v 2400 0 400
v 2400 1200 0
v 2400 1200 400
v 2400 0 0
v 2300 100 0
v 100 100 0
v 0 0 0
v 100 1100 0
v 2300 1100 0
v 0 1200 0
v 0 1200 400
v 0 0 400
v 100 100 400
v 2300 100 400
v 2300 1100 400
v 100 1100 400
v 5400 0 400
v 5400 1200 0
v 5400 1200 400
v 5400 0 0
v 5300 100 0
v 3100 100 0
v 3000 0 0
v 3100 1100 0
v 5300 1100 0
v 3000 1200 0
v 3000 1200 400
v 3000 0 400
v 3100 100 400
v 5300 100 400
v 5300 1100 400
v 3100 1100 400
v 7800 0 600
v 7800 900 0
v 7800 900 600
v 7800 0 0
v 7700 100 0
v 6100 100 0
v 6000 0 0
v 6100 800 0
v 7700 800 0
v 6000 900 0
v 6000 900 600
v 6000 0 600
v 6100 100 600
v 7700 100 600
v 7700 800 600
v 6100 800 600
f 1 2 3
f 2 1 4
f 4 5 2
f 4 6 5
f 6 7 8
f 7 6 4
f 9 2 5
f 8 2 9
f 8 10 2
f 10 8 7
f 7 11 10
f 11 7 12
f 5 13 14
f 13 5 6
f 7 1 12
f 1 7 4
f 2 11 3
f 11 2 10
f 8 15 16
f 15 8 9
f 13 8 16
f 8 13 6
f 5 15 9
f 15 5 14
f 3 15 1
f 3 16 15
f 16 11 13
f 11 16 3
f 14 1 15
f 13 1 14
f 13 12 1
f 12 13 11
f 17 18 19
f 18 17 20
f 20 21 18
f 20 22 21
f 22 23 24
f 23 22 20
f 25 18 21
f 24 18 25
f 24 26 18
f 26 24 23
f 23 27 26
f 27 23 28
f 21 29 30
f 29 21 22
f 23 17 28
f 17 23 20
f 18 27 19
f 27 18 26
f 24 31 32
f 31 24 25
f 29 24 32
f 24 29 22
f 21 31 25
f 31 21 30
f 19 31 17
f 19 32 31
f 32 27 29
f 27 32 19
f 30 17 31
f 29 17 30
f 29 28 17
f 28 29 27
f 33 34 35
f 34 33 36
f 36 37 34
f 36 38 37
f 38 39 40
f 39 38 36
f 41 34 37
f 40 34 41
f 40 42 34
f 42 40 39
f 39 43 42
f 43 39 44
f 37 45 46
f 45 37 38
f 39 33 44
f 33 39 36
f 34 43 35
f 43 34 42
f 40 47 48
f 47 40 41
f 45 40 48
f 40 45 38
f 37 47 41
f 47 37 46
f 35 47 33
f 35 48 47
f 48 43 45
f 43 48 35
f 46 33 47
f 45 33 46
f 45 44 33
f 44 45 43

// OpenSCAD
// Generated from plan.json; millimetres. Not a structural design.
// Open in OpenSCAD. Increase explode_mm to inspect courses.
explode_mm = 0;
$fn = 24;
show_fixing_paths = false;

// front-01-C1-S
translate([0, 0, 0+0*explode_mm])
  color([0.70,0.52,0.33]) cube([2400, 100, 200]);
// front-01-C1-N
translate([0, 1100, 0+0*explode_mm])
  color([0.70,0.52,0.33]) cube([2400, 100, 200]);
// front-01-C1-W
translate([0, 100, 0+0*explode_mm])
  color([0.70,0.52,0.33]) cube([100, 1000, 200]);
// front-01-C1-E
translate([2300, 100, 0+0*explode_mm])
  color([0.70,0.52,0.33]) cube([100, 1000, 200]);
// front-01-C2-S
translate([100, 0, 200+1*explode_mm])
  color([0.70,0.52,0.33]) cube([2200, 100, 200]);
// front-01-C2-N
translate([100, 1100, 200+1*explode_mm])
  color([0.70,0.52,0.33]) cube([2200, 100, 200]);
// front-01-C2-W
translate([0, 0, 200+1*explode_mm])
  color([0.70,0.52,0.33]) cube([100, 1200, 200]);
// front-01-C2-E
translate([2300, 0, 200+1*explode_mm])
  color([0.70,0.52,0.33]) cube([100, 1200, 200]);
// front-02-C1-S
translate([3000, 0, 0+0*explode_mm])
  color([0.70,0.52,0.33]) cube([2400, 100, 200]);
// front-02-C1-N
translate([3000, 1100, 0+0*explode_mm])
  color([0.70,0.52,0.33]) cube([2400, 100, 200]);
// front-02-C1-W
translate([3000, 100, 0+0*explode_mm])
  color([0.70,0.52,0.33]) cube([100, 1000, 200]);
// front-02-C1-E
translate([5300, 100, 0+0*explode_mm])
  color([0.70,0.52,0.33]) cube([100, 1000, 200]);
// front-02-C2-S
translate([3100, 0, 200+1*explode_mm])
  color([0.70,0.52,0.33]) cube([2200, 100, 200]);
// front-02-C2-N
translate([3100, 1100, 200+1*explode_mm])
  color([0.70,0.52,0.33]) cube([2200, 100, 200]);
// front-02-C2-W
translate([3000, 0, 200+1*explode_mm])
  color([0.70,0.52,0.33]) cube([100, 1200, 200]);
// front-02-C2-E
translate([5300, 0, 200+1*explode_mm])
  color([0.70,0.52,0.33]) cube([100, 1200, 200]);
// side-01-C1-S
translate([6000, 0, 0+0*explode_mm])
  color([0.70,0.52,0.33]) cube([1800, 100, 200]);
// side-01-C1-N
translate([6000, 800, 0+0*explode_mm])
  color([0.70,0.52,0.33]) cube([1800, 100, 200]);
// side-01-C1-W
translate([6000, 100, 0+0*explode_mm])
  color([0.70,0.52,0.33]) cube([100, 700, 200]);
// side-01-C1-E
translate([7700, 100, 0+0*explode_mm])
  color([0.70,0.52,0.33]) cube([100, 700, 200]);
// side-01-C2-S
translate([6100, 0, 200+1*explode_mm])
  color([0.70,0.52,0.33]) cube([1600, 100, 200]);
// side-01-C2-N
translate([6100, 800, 200+1*explode_mm])
  color([0.70,0.52,0.33]) cube([1600, 100, 200]);
// side-01-C2-W
translate([6000, 0, 200+1*explode_mm])
  color([0.70,0.52,0.33]) cube([100, 900, 200]);
// side-01-C2-E
translate([7700, 0, 200+1*explode_mm])
  color([0.70,0.52,0.33]) cube([100, 900, 200]);
// side-01-C3-S
translate([6000, 0, 400+2*explode_mm])
  color([0.70,0.52,0.33]) cube([1800, 100, 200]);
// side-01-C3-N
translate([6000, 800, 400+2*explode_mm])
  color([0.70,0.52,0.33]) cube([1800, 100, 200]);
// side-01-C3-W
translate([6000, 100, 400+2*explode_mm])
  color([0.70,0.52,0.33]) cube([100, 700, 200]);
// side-01-C3-E
translate([7700, 100, 400+2*explode_mm])
  color([0.70,0.52,0.33]) cube([100, 700, 200]);
if (show_fixing_paths) translate([50.0, 1200, 50.0+0*explode_mm]) rotate([90,0,0]) color([0.8,0.1,0.1]) cylinder(d=7, h=150);
if (show_fixing_paths) translate([50.0, 1200, 150.0+0*explode_mm]) rotate([90,0,0]) color([0.8,0.1,0.1]) cylinder(d=7, h=150);
if (show_fixing_paths) translate([2350.0, 1200, 50.0+0*explode_mm]) rotate([90,0,0]) color([0.8,0.1,0.1]) cylinder(d=7, h=150);
if (show_fixing_paths) translate([2350.0, 1200, 150.0+0*explode_mm]) rotate([90,0,0]) color([0.8,0.1,0.1]) cylinder(d=7, h=150);
if (show_fixing_paths) translate([50.0, 0, 50.0+0*explode_mm]) rotate([-90,0,0]) color([0.8,0.1,0.1]) cylinder(d=7, h=150);
if (show_fixing_paths) translate([50.0, 0, 150.0+0*explode_mm]) rotate([-90,0,0]) color([0.8,0.1,0.1]) cylinder(d=7, h=150);
if (show_fixing_paths) translate([2350.0, 0, 50.0+0*explode_mm]) rotate([-90,0,0]) color([0.8,0.1,0.1]) cylinder(d=7, h=150);
if (show_fixing_paths) translate([2350.0, 0, 150.0+0*explode_mm]) rotate([-90,0,0]) color([0.8,0.1,0.1]) cylinder(d=7, h=150);
if (show_fixing_paths) translate([2400, 50.0, 250.0+1*explode_mm]) rotate([0,-90,0]) color([0.8,0.1,0.1]) cylinder(d=7, h=150);
if (show_fixing_paths) translate([2400, 50.0, 350.0+1*explode_mm]) rotate([0,-90,0]) color([0.8,0.1,0.1]) cylinder(d=7, h=150);
if (show_fixing_paths) translate([2400, 1150.0, 250.0+1*explode_mm]) rotate([0,-90,0]) color([0.8,0.1,0.1]) cylinder(d=7, h=150);
if (show_fixing_paths) translate([2400, 1150.0, 350.0+1*explode_mm]) rotate([0,-90,0]) color([0.8,0.1,0.1]) cylinder(d=7, h=150);
if (show_fixing_paths) translate([2350.0, 200.0, 400+1*explode_mm]) rotate([180,0,0]) color([0.8,0.1,0.1]) cylinder(d=7, h=250);
if (show_fixing_paths) translate([2350.0, 600.0, 400+1*explode_mm]) rotate([180,0,0]) color([0.8,0.1,0.1]) cylinder(d=7, h=250);
if (show_fixing_paths) translate([2350.0, 1000.0, 400+1*explode_mm]) rotate([180,0,0]) color([0.8,0.1,0.1]) cylinder(d=7, h=250);
if (show_fixing_paths) translate([300.0, 1150.0, 400+1*explode_mm]) rotate([180,0,0]) color([0.8,0.1,0.1]) cylinder(d=7, h=250);
if (show_fixing_paths) translate([900.0, 1150.0, 400+1*explode_mm]) rotate([180,0,0]) color([0.8,0.1,0.1]) cylinder(d=7, h=250);
if (show_fixing_paths) translate([1500.0, 1150.0, 400+1*explode_mm]) rotate([180,0,0]) color([0.8,0.1,0.1]) cylinder(d=7, h=250);
if (show_fixing_paths) translate([2100.0, 1150.0, 400+1*explode_mm]) rotate([180,0,0]) color([0.8,0.1,0.1]) cylinder(d=7, h=250);
if (show_fixing_paths) translate([300.0, 50.0, 400+1*explode_mm]) rotate([180,0,0]) color([0.8,0.1,0.1]) cylinder(d=7, h=250);
if (show_fixing_paths) translate([900.0, 50.0, 400+1*explode_mm]) rotate([180,0,0]) color([0.8,0.1,0.1]) cylinder(d=7, h=250);
if (show_fixing_paths) translate([1500.0, 50.0, 400+1*explode_mm]) rotate([180,0,0]) color([0.8,0.1,0.1]) cylinder(d=7, h=250);
if (show_fixing_paths) translate([2100.0, 50.0, 400+1*explode_mm]) rotate([180,0,0]) color([0.8,0.1,0.1]) cylinder(d=7, h=250);
if (show_fixing_paths) translate([0, 50.0, 250.0+1*explode_mm]) rotate([0,90,0]) color([0.8,0.1,0.1]) cylinder(d=7, h=150);
if (show_fixing_paths) translate([0, 50.0, 350.0+1*explode_mm]) rotate([0,90,0]) color([0.8,0.1,0.1]) cylinder(d=7, h=150);
if (show_fixing_paths) translate([0, 1150.0, 250.0+1*explode_mm]) rotate([0,90,0]) color([0.8,0.1,0.1]) cylinder(d=7, h=150);
if (show_fixing_paths) translate([0, 1150.0, 350.0+1*explode_mm]) rotate([0,90,0]) color([0.8,0.1,0.1]) cylinder(d=7, h=150);
if (show_fixing_paths) translate([50.0, 200.0, 400+1*explode_mm]) rotate([180,0,0]) color([0.8,0.1,0.1]) cylinder(d=7, h=250);
if (show_fixing_paths) translate([50.0, 600.0, 400+1*explode_mm]) rotate([180,0,0]) color([0.8,0.1,0.1]) cylinder(d=7, h=250);
if (show_fixing_paths) translate([50.0, 1000.0, 400+1*explode_mm]) rotate([180,0,0]) color([0.8,0.1,0.1]) cylinder(d=7, h=250);
if (show_fixing_paths) translate([3050.0, 1200, 50.0+0*explode_mm]) rotate([90,0,0]) color([0.8,0.1,0.1]) cylinder(d=7, h=150);
if (show_fixing_paths) translate([3050.0, 1200, 150.0+0*explode_mm]) rotate([90,0,0]) color([0.8,0.1,0.1]) cylinder(d=7, h=150);
if (show_fixing_paths) translate([5350.0, 1200, 50.0+0*explode_mm]) rotate([90,0,0]) color([0.8,0.1,0.1]) cylinder(d=7, h=150);
if (show_fixing_paths) translate([5350.0, 1200, 150.0+0*explode_mm]) rotate([90,0,0]) color([0.8,0.1,0.1]) cylinder(d=7, h=150);
if (show_fixing_paths) translate([3050.0, 0, 50.0+0*explode_mm]) rotate([-90,0,0]) color([0.8,0.1,0.1]) cylinder(d=7, h=150);
if (show_fixing_paths) translate([3050.0, 0, 150.0+0*explode_mm]) rotate([-90,0,0]) color([0.8,0.1,0.1]) cylinder(d=7, h=150);
if (show_fixing_paths) translate([5350.0, 0, 50.0+0*explode_mm]) rotate([-90,0,0]) color([0.8,0.1,0.1]) cylinder(d=7, h=150);
if (show_fixing_paths) translate([5350.0, 0, 150.0+0*explode_mm]) rotate([-90,0,0]) color([0.8,0.1,0.1]) cylinder(d=7, h=150);
if (show_fixing_paths) translate([5400, 50.0, 250.0+1*explode_mm]) rotate([0,-90,0]) color([0.8,0.1,0.1]) cylinder(d=7, h=150);
if (show_fixing_paths) translate([5400, 50.0, 350.0+1*explode_mm]) rotate([0,-90,0]) color([0.8,0.1,0.1]) cylinder(d=7, h=150);
if (show_fixing_paths) translate([5400, 1150.0, 250.0+1*explode_mm]) rotate([0,-90,0]) color([0.8,0.1,0.1]) cylinder(d=7, h=150);
if (show_fixing_paths) translate([5400, 1150.0, 350.0+1*explode_mm]) rotate([0,-90,0]) color([0.8,0.1,0.1]) cylinder(d=7, h=150);
if (show_fixing_paths) translate([5350.0, 200.0, 400+1*explode_mm]) rotate([180,0,0]) color([0.8,0.1,0.1]) cylinder(d=7, h=250);
if (show_fixing_paths) translate([5350.0, 600.0, 400+1*explode_mm]) rotate([180,0,0]) color([0.8,0.1,0.1]) cylinder(d=7, h=250);
if (show_fixing_paths) translate([5350.0, 1000.0, 400+1*explode_mm]) rotate([180,0,0]) color([0.8,0.1,0.1]) cylinder(d=7, h=250);
if (show_fixing_paths) translate([3300.0, 1150.0, 400+1*explode_mm]) rotate([180,0,0]) color([0.8,0.1,0.1]) cylinder(d=7, h=250);
if (show_fixing_paths) translate([3900.0, 1150.0, 400+1*explode_mm]) rotate([180,0,0]) color([0.8,0.1,0.1]) cylinder(d=7, h=250);
if (show_fixing_paths) translate([4500.0, 1150.0, 400+1*explode_mm]) rotate([180,0,0]) color([0.8,0.1,0.1]) cylinder(d=7, h=250);
if (show_fixing_paths) translate([5100.0, 1150.0, 400+1*explode_mm]) rotate([180,0,0]) color([0.8,0.1,0.1]) cylinder(d=7, h=250);
if (show_fixing_paths) translate([3300.0, 50.0, 400+1*explode_mm]) rotate([180,0,0]) color([0.8,0.1,0.1]) cylinder(d=7, h=250);
if (show_fixing_paths) translate([3900.0, 50.0, 400+1*explode_mm]) rotate([180,0,0]) color([0.8,0.1,0.1]) cylinder(d=7, h=250);
if (show_fixing_paths) translate([4500.0, 50.0, 400+1*explode_mm]) rotate([180,0,0]) color([0.8,0.1,0.1]) cylinder(d=7, h=250);
if (show_fixing_paths) translate([5100.0, 50.0, 400+1*explode_mm]) rotate([180,0,0]) color([0.8,0.1,0.1]) cylinder(d=7, h=250);
if (show_fixing_paths) translate([3000, 50.0, 250.0+1*explode_mm]) rotate([0,90,0]) color([0.8,0.1,0.1]) cylinder(d=7, h=150);
if (show_fixing_paths) translate([3000, 50.0, 350.0+1*explode_mm]) rotate([0,90,0]) color([0.8,0.1,0.1]) cylinder(d=7, h=150);
if (show_fixing_paths) translate([3000, 1150.0, 250.0+1*explode_mm]) rotate([0,90,0]) color([0.8,0.1,0.1]) cylinder(d=7, h=150);
if (show_fixing_paths) translate([3000, 1150.0, 350.0+1*explode_mm]) rotate([0,90,0]) color([0.8,0.1,0.1]) cylinder(d=7, h=150);
if (show_fixing_paths) translate([3050.0, 200.0, 400+1*explode_mm]) rotate([180,0,0]) color([0.8,0.1,0.1]) cylinder(d=7, h=250);
if (show_fixing_paths) translate([3050.0, 600.0, 400+1*explode_mm]) rotate([180,0,0]) color([0.8,0.1,0.1]) cylinder(d=7, h=250);
if (show_fixing_paths) translate([3050.0, 1000.0, 400+1*explode_mm]) rotate([180,0,0]) color([0.8,0.1,0.1]) cylinder(d=7, h=250);
if (show_fixing_paths) translate([6050.0, 900, 50.0+0*explode_mm]) rotate([90,0,0]) color([0.8,0.1,0.1]) cylinder(d=7, h=150);
if (show_fixing_paths) translate([6050.0, 900, 150.0+0*explode_mm]) rotate([90,0,0]) color([0.8,0.1,0.1]) cylinder(d=7, h=150);
if (show_fixing_paths) translate([7750.0, 900, 50.0+0*explode_mm]) rotate([90,0,0]) color([0.8,0.1,0.1]) cylinder(d=7, h=150);
if (show_fixing_paths) translate([7750.0, 900, 150.0+0*explode_mm]) rotate([90,0,0]) color([0.8,0.1,0.1]) cylinder(d=7, h=150);
if (show_fixing_paths) translate([6050.0, 0, 50.0+0*explode_mm]) rotate([-90,0,0]) color([0.8,0.1,0.1]) cylinder(d=7, h=150);
if (show_fixing_paths) translate([6050.0, 0, 150.0+0*explode_mm]) rotate([-90,0,0]) color([0.8,0.1,0.1]) cylinder(d=7, h=150);
if (show_fixing_paths) translate([7750.0, 0, 50.0+0*explode_mm]) rotate([-90,0,0]) color([0.8,0.1,0.1]) cylinder(d=7, h=150);
if (show_fixing_paths) translate([7750.0, 0, 150.0+0*explode_mm]) rotate([-90,0,0]) color([0.8,0.1,0.1]) cylinder(d=7, h=150);
if (show_fixing_paths) translate([7800, 50.0, 250.0+1*explode_mm]) rotate([0,-90,0]) color([0.8,0.1,0.1]) cylinder(d=7, h=150);
if (show_fixing_paths) translate([7800, 50.0, 350.0+1*explode_mm]) rotate([0,-90,0]) color([0.8,0.1,0.1]) cylinder(d=7, h=150);
if (show_fixing_paths) translate([7800, 850.0, 250.0+1*explode_mm]) rotate([0,-90,0]) color([0.8,0.1,0.1]) cylinder(d=7, h=150);
if (show_fixing_paths) translate([7800, 850.0, 350.0+1*explode_mm]) rotate([0,-90,0]) color([0.8,0.1,0.1]) cylinder(d=7, h=150);
if (show_fixing_paths) translate([7750.0, 200.0, 400+1*explode_mm]) rotate([180,0,0]) color([0.8,0.1,0.1]) cylinder(d=7, h=250);
if (show_fixing_paths) translate([7750.0, 700.0, 400+1*explode_mm]) rotate([180,0,0]) color([0.8,0.1,0.1]) cylinder(d=7, h=250);
if (show_fixing_paths) translate([6300.0, 850.0, 400+1*explode_mm]) rotate([180,0,0]) color([0.8,0.1,0.1]) cylinder(d=7, h=250);
if (show_fixing_paths) translate([6900.0, 850.0, 400+1*explode_mm]) rotate([180,0,0]) color([0.8,0.1,0.1]) cylinder(d=7, h=250);
if (show_fixing_paths) translate([7500.0, 850.0, 400+1*explode_mm]) rotate([180,0,0]) color([0.8,0.1,0.1]) cylinder(d=7, h=250);
if (show_fixing_paths) translate([6300.0, 50.0, 400+1*explode_mm]) rotate([180,0,0]) color([0.8,0.1,0.1]) cylinder(d=7, h=250);
if (show_fixing_paths) translate([6900.0, 50.0, 400+1*explode_mm]) rotate([180,0,0]) color([0.8,0.1,0.1]) cylinder(d=7, h=250);
if (show_fixing_paths) translate([7500.0, 50.0, 400+1*explode_mm]) rotate([180,0,0]) color([0.8,0.1,0.1]) cylinder(d=7, h=250);
if (show_fixing_paths) translate([6000, 50.0, 250.0+1*explode_mm]) rotate([0,90,0]) color([0.8,0.1,0.1]) cylinder(d=7, h=150);
if (show_fixing_paths) translate([6000, 50.0, 350.0+1*explode_mm]) rotate([0,90,0]) color([0.8,0.1,0.1]) cylinder(d=7, h=150);
if (show_fixing_paths) translate([6000, 850.0, 250.0+1*explode_mm]) rotate([0,90,0]) color([0.8,0.1,0.1]) cylinder(d=7, h=150);
if (show_fixing_paths) translate([6000, 850.0, 350.0+1*explode_mm]) rotate([0,90,0]) color([0.8,0.1,0.1]) cylinder(d=7, h=150);
if (show_fixing_paths) translate([6050.0, 200.0, 400+1*explode_mm]) rotate([180,0,0]) color([0.8,0.1,0.1]) cylinder(d=7, h=250);
if (show_fixing_paths) translate([6050.0, 700.0, 400+1*explode_mm]) rotate([180,0,0]) color([0.8,0.1,0.1]) cylinder(d=7, h=250);
if (show_fixing_paths) translate([7750.0, 340.0, 600+2*explode_mm]) rotate([180,0,0]) color([0.8,0.1,0.1]) cylinder(d=7, h=250);
if (show_fixing_paths) translate([7750.0, 640.0, 600+2*explode_mm]) rotate([180,0,0]) color([0.8,0.1,0.1]) cylinder(d=7, h=250);
if (show_fixing_paths) translate([6050.0, 900, 450.0+2*explode_mm]) rotate([90,0,0]) color([0.8,0.1,0.1]) cylinder(d=7, h=150);
if (show_fixing_paths) translate([6050.0, 900, 550.0+2*explode_mm]) rotate([90,0,0]) color([0.8,0.1,0.1]) cylinder(d=7, h=150);
if (show_fixing_paths) translate([7750.0, 900, 450.0+2*explode_mm]) rotate([90,0,0]) color([0.8,0.1,0.1]) cylinder(d=7, h=150);
if (show_fixing_paths) translate([7750.0, 900, 550.0+2*explode_mm]) rotate([90,0,0]) color([0.8,0.1,0.1]) cylinder(d=7, h=150);
if (show_fixing_paths) translate([6240.0, 850.0, 600+2*explode_mm]) rotate([180,0,0]) color([0.8,0.1,0.1]) cylinder(d=7, h=250);
if (show_fixing_paths) translate([6706.667, 850.0, 600+2*explode_mm]) rotate([180,0,0]) color([0.8,0.1,0.1]) cylinder(d=7, h=250);
if (show_fixing_paths) translate([7173.3330000000005, 850.0, 600+2*explode_mm]) rotate([180,0,0]) color([0.8,0.1,0.1]) cylinder(d=7, h=250);
if (show_fixing_paths) translate([7620.0, 850.0, 600+2*explode_mm]) rotate([180,0,0]) color([0.8,0.1,0.1]) cylinder(d=7, h=250);
if (show_fixing_paths) translate([6050.0, 0, 450.0+2*explode_mm]) rotate([-90,0,0]) color([0.8,0.1,0.1]) cylinder(d=7, h=150);
if (show_fixing_paths) translate([6050.0, 0, 550.0+2*explode_mm]) rotate([-90,0,0]) color([0.8,0.1,0.1]) cylinder(d=7, h=150);
if (show_fixing_paths) translate([7750.0, 0, 450.0+2*explode_mm]) rotate([-90,0,0]) color([0.8,0.1,0.1]) cylinder(d=7, h=150);
if (show_fixing_paths) translate([7750.0, 0, 550.0+2*explode_mm]) rotate([-90,0,0]) color([0.8,0.1,0.1]) cylinder(d=7, h=150);
if (show_fixing_paths) translate([6240.0, 50.0, 600+2*explode_mm]) rotate([180,0,0]) color([0.8,0.1,0.1]) cylinder(d=7, h=250);
if (show_fixing_paths) translate([6706.667, 50.0, 600+2*explode_mm]) rotate([180,0,0]) color([0.8,0.1,0.1]) cylinder(d=7, h=250);
if (show_fixing_paths) translate([7173.3330000000005, 50.0, 600+2*explode_mm]) rotate([180,0,0]) color([0.8,0.1,0.1]) cylinder(d=7, h=250);
if (show_fixing_paths) translate([7620.0, 50.0, 600+2*explode_mm]) rotate([180,0,0]) color([0.8,0.1,0.1]) cylinder(d=7, h=250);
if (show_fixing_paths) translate([6050.0, 340.0, 600+2*explode_mm]) rotate([180,0,0]) color([0.8,0.1,0.1]) cylinder(d=7, h=250);
if (show_fixing_paths) translate([6050.0, 640.0, 600+2*explode_mm]) rotate([180,0,0]) color([0.8,0.1,0.1]) cylinder(d=7, h=250);
